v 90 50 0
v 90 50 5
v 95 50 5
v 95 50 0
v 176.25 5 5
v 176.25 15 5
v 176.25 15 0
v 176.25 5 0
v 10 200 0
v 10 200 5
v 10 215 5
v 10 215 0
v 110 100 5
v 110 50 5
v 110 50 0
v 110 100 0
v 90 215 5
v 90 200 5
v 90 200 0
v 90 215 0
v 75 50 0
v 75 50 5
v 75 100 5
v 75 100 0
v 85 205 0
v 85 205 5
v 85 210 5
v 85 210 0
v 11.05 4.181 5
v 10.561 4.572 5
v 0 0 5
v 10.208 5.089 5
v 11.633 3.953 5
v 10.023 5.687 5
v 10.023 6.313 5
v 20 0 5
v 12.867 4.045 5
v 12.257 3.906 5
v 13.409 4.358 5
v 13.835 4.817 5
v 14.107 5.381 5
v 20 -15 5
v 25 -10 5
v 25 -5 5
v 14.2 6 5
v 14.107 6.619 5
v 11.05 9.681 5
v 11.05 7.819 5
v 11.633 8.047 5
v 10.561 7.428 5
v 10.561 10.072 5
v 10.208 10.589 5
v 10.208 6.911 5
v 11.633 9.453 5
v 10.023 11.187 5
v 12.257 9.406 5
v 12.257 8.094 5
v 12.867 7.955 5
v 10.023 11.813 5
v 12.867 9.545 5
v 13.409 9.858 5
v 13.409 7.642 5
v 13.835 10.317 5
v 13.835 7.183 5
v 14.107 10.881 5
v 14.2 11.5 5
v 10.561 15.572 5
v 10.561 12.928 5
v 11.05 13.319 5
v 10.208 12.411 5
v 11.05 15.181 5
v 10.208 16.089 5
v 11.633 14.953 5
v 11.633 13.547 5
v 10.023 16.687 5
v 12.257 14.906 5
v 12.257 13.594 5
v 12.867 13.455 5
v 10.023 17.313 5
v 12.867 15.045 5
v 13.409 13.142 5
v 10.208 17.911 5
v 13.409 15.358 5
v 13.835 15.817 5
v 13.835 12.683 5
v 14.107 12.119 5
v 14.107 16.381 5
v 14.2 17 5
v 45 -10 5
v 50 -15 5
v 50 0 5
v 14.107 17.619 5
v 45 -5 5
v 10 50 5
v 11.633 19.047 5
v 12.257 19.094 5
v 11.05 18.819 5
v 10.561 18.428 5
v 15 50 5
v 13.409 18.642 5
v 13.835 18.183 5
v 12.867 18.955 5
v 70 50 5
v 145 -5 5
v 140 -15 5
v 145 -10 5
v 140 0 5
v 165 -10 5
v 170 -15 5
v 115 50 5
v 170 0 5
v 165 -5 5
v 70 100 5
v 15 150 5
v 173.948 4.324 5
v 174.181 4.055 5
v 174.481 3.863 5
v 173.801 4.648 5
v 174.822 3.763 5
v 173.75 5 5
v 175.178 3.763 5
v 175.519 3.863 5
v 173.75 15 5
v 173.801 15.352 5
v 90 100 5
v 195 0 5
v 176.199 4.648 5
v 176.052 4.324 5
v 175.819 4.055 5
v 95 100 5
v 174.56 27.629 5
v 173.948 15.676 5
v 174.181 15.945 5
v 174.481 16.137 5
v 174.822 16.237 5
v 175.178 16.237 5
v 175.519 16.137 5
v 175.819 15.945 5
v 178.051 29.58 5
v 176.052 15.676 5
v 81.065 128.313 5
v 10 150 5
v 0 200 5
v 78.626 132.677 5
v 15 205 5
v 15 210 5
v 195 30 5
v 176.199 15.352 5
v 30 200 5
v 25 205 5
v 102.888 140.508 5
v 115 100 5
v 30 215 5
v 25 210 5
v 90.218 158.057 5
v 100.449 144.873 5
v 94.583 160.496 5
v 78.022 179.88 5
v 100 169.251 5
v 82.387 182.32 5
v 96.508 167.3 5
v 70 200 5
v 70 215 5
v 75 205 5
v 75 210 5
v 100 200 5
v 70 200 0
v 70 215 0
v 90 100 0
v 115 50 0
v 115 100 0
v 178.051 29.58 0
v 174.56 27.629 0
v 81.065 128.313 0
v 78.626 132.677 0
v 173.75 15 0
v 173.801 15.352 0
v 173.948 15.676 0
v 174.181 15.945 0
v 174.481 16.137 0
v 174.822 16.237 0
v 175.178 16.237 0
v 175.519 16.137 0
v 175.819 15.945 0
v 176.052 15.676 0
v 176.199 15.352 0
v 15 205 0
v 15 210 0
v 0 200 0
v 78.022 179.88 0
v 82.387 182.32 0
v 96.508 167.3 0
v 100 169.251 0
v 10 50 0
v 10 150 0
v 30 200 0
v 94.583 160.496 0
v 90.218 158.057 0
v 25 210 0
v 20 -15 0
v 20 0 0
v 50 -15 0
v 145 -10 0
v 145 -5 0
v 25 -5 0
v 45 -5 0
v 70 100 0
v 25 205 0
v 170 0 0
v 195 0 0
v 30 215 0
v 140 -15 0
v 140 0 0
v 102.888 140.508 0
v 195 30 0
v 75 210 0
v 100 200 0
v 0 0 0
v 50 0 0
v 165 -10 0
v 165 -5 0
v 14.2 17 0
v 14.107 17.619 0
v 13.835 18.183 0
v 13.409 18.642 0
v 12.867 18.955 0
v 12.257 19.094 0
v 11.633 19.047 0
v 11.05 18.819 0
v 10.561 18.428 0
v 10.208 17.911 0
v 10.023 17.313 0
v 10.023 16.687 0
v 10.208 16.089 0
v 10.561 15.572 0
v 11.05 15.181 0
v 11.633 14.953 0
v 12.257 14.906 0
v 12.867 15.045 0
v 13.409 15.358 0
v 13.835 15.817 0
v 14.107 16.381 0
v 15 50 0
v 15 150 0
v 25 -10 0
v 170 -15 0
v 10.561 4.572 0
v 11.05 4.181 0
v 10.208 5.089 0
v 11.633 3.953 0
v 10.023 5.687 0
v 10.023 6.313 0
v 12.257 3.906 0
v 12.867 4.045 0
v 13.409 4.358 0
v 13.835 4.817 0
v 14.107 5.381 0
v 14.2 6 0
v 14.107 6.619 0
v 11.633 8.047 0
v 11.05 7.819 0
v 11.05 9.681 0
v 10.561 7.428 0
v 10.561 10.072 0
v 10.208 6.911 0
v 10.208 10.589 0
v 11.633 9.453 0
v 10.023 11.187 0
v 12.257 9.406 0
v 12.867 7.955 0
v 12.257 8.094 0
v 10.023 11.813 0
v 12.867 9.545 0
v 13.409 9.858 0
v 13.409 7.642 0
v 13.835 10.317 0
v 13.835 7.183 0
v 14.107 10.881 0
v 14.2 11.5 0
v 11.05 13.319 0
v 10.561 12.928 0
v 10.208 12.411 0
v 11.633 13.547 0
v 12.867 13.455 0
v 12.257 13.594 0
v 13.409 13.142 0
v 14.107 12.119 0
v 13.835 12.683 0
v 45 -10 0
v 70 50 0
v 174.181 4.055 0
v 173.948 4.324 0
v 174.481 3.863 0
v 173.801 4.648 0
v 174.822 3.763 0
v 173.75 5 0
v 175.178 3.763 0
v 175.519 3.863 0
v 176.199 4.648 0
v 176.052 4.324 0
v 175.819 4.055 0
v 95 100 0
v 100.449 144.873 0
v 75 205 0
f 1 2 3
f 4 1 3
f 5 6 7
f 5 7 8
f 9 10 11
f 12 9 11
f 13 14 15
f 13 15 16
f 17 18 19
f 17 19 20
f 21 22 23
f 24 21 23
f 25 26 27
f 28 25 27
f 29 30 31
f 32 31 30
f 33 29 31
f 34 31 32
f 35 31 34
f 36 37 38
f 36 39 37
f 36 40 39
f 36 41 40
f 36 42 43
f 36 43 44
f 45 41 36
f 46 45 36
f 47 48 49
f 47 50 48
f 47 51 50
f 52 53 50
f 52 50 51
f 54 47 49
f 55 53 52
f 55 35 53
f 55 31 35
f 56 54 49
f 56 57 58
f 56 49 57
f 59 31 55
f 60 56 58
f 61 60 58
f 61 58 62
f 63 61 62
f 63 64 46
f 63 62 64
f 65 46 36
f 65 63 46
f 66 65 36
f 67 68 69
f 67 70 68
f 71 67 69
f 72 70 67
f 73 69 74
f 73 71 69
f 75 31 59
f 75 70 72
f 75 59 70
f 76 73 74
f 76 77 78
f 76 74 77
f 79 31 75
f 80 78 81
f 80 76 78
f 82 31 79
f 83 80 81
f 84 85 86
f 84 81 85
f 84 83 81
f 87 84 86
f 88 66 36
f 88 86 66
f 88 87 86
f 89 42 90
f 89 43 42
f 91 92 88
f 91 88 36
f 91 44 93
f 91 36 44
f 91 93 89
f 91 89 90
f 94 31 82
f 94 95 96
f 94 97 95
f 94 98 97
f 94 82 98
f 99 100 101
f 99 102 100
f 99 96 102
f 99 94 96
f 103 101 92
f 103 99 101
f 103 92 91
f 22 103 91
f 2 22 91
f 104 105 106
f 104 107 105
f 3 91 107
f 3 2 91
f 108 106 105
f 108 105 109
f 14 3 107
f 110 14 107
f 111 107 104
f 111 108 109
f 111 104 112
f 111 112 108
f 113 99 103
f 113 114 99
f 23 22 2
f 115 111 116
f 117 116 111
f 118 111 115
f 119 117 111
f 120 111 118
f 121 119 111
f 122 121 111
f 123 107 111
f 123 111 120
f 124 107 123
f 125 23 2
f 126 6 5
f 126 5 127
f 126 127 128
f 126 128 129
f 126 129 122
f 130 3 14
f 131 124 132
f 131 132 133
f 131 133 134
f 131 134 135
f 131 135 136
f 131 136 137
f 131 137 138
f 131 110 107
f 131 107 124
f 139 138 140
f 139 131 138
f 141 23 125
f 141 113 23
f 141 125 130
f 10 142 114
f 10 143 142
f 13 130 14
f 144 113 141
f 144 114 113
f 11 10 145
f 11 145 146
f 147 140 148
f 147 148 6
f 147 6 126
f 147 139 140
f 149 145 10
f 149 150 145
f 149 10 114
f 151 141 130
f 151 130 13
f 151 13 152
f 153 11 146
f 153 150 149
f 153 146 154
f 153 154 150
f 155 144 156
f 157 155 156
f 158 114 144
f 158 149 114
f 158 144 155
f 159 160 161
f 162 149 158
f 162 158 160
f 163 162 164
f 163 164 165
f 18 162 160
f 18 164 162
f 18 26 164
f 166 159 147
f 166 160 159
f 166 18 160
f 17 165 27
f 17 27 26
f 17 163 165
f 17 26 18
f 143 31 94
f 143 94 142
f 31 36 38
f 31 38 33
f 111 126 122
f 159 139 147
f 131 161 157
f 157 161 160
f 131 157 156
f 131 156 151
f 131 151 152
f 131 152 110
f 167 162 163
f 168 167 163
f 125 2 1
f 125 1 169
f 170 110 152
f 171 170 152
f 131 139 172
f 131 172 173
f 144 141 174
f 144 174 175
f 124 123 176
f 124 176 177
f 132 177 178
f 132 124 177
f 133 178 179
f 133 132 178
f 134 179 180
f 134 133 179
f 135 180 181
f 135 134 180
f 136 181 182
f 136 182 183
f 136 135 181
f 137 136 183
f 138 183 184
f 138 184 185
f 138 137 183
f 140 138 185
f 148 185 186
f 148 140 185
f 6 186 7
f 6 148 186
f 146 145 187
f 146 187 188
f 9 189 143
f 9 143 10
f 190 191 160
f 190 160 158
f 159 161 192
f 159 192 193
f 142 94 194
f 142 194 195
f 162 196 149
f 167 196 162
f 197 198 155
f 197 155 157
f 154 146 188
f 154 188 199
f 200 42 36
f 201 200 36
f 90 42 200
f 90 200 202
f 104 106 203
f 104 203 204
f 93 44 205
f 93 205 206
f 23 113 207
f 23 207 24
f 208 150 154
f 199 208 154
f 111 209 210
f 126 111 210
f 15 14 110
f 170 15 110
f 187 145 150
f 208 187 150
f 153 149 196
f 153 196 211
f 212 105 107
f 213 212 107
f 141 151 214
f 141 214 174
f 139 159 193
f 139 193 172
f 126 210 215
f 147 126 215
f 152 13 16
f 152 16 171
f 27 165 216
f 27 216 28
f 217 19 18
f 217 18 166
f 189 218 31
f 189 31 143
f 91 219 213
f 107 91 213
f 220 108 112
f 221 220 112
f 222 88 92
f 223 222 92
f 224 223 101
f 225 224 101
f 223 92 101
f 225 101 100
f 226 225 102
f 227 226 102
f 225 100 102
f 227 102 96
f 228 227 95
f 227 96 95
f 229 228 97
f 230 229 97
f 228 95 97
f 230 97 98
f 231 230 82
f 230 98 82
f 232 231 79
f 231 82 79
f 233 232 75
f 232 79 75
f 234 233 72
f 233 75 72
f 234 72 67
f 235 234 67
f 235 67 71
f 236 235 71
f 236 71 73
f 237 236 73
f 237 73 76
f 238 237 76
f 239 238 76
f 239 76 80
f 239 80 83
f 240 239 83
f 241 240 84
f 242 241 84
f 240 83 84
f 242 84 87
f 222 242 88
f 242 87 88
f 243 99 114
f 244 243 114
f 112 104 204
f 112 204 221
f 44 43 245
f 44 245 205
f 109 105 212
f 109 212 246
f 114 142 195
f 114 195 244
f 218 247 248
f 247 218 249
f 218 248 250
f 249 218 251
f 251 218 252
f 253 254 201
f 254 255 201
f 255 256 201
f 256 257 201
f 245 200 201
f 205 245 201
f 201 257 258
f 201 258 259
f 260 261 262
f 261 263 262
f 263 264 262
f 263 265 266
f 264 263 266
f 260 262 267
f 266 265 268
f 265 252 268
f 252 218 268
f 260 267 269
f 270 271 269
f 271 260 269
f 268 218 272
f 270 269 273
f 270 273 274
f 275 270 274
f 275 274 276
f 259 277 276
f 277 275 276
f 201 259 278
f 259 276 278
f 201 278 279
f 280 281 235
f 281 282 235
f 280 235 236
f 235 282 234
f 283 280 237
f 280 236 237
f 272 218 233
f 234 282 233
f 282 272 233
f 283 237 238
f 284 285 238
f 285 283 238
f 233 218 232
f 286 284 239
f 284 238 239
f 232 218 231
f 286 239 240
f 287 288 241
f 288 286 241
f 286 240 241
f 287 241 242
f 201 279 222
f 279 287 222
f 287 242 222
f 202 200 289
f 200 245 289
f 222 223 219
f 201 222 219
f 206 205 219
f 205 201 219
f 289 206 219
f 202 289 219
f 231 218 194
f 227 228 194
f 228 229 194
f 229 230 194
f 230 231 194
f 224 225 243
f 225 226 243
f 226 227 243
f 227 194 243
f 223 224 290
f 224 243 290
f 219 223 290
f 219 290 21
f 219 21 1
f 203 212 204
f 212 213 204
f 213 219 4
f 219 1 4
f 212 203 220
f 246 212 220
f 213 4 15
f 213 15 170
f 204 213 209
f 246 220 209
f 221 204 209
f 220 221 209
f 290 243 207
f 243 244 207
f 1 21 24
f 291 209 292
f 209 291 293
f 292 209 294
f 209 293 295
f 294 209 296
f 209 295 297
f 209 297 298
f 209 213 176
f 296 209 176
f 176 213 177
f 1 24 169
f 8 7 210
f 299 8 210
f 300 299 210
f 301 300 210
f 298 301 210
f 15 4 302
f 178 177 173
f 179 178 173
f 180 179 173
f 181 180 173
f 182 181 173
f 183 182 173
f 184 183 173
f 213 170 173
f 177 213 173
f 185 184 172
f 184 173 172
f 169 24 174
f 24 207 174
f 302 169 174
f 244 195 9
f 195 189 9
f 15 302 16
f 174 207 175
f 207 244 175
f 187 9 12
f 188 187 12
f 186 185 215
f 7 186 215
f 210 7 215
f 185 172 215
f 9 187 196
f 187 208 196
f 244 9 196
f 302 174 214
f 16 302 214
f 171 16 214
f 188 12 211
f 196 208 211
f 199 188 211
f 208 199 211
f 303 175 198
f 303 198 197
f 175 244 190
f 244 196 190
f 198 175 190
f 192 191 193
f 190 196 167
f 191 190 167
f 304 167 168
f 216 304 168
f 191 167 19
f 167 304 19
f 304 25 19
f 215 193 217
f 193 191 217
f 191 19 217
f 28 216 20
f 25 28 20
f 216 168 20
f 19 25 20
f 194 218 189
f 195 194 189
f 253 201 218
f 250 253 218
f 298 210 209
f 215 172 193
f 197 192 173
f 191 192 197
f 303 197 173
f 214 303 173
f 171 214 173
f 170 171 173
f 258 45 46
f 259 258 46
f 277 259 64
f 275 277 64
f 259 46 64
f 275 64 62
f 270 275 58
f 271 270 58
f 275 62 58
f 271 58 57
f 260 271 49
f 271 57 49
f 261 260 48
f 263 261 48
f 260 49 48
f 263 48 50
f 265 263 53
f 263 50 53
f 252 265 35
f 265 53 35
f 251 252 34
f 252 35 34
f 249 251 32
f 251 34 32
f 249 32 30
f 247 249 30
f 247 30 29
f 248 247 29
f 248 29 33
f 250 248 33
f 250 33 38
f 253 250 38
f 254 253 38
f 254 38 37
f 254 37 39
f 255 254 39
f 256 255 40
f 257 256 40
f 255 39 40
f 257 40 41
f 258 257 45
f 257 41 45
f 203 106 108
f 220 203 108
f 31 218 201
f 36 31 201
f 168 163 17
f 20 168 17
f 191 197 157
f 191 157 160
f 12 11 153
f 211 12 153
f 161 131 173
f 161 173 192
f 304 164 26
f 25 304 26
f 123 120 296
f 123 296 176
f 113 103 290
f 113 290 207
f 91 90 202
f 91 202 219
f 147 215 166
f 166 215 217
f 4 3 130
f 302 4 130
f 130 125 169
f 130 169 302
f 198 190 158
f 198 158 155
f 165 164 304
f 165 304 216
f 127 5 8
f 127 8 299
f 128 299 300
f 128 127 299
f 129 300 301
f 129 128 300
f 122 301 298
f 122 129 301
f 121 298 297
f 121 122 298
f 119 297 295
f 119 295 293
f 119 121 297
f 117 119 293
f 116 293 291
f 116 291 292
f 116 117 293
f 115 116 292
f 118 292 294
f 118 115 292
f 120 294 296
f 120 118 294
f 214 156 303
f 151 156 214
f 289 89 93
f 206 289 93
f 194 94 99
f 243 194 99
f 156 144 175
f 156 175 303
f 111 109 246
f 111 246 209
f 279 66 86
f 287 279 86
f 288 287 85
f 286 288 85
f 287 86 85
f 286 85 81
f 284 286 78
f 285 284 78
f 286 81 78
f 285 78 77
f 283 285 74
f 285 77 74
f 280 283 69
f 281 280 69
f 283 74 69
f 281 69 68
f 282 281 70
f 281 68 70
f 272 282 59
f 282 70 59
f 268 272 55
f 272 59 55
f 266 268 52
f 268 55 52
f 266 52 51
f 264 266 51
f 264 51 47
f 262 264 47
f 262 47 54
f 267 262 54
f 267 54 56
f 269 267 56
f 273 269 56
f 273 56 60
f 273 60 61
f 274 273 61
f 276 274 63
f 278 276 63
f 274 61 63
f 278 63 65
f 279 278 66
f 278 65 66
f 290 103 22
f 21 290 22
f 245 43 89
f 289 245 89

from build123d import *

# Parameters (mm, degrees)
SKETCH1_W           = 100
SKETCH1_H           = 200
SKETCH1_W_2         = 95
SKETCH1_H_2         = 30
BOSS_EXTRUDE1_DEPTH = 5
SKETCH2_R           = 2.1
CUT_EXTRUDE1_DEPTH  = 5
SKETCH3_W           = 20
SKETCH3_H           = 15
SKETCH3_W_2         = 10
SKETCH3_H_2         = 5
BOSS_EXTRUDE2_DEPTH = 5
SKETCH4_R           = 2.1
CUT_EXTRUDE2_DEPTH  = 5
SKETCH5_W           = 30
SKETCH5_H           = 15
SKETCH5_W_2         = 20
SKETCH5_H_2         = 5
BOSS_EXTRUDE3_DEPTH = 5
CUT_EXTRUDE3_DEPTH  = 5
SKETCH7_W           = 5
SKETCH7_H           = 50
CUT_EXTRUDE4_DEPTH  = 5
CUT_EXTRUDE5_DEPTH  = 5
SKETCH9_W           = 5
SKETCH9_H           = 100
CUT_EXTRUDE6_DEPTH  = 5
CUT_EXTRUDE7_DEPTH  = 5


with BuildPart() as part:
    # Sketch1 → Boss-Extrude1 (new body)
    with BuildSketch(Plane.XY):
        Polygon((100, 30), (195, 30), (100, 200), align=None)
        with Locations((50, 100)):
            Rectangle(SKETCH1_W, SKETCH1_H)
        with Locations((147.5, 15)):
            Rectangle(SKETCH1_W_2, SKETCH1_H_2)
    extrude(amount=BOSS_EXTRUDE1_DEPTH)

    # Sketch2 → Cut-Extrude1 (cut)
    with BuildSketch(Plane.XY.offset(5)):
        with Locations((12.1, 6)):
            Circle(SKETCH2_R)
    extrude(amount=-CUT_EXTRUDE1_DEPTH, mode=Mode.SUBTRACT)

    # Sketch3 → Boss-Extrude2 (add)
    # profile 1 of 2: a face of its own
    with BuildSketch(Plane.XY.offset(5)):
        with Locations((20, 207.5)):
            Rectangle(SKETCH3_W, SKETCH3_H)
        with Locations((20, 207.5)):
            Rectangle(SKETCH3_W_2, SKETCH3_H_2, mode=Mode.SUBTRACT)
    # profile 2 of 2: a face of its own
    with BuildSketch(Plane.XY.offset(5)):
        with Locations((80, 207.5)):
            Rectangle(SKETCH3_W, SKETCH3_H)
        with Locations((80, 207.5)):
            Rectangle(SKETCH3_W_2, SKETCH3_H_2, mode=Mode.SUBTRACT)
    extrude(amount=-BOSS_EXTRUDE2_DEPTH)

    # Sketch4 → Cut-Extrude2 (cut)
    with BuildSketch(Plane.XY.offset(5)):
        with Locations((12.1, 11.5)):
            Circle(SKETCH4_R)
        with Locations((12.1, 17)):
            Circle(SKETCH4_R)
    extrude(amount=-CUT_EXTRUDE2_DEPTH, mode=Mode.SUBTRACT)

    # Sketch5 → Boss-Extrude3 (add)
    # profile 1 of 2: a face of its own
    with BuildSketch(Plane.XY.offset(5)):
        with Locations((35, -7.5)):
            Rectangle(SKETCH5_W, SKETCH5_H)
        with Locations((35, -7.5)):
            Rectangle(SKETCH5_W_2, SKETCH5_H_2, mode=Mode.SUBTRACT)
    # profile 2 of 2: a face of its own
    with BuildSketch(Plane.XY.offset(5)):
        with Locations((155, -7.5)):
            Rectangle(SKETCH5_W, SKETCH5_H)
        with Locations((155, -7.5)):
            Rectangle(SKETCH5_W_2, SKETCH5_H_2, mode=Mode.SUBTRACT)
    extrude(amount=-BOSS_EXTRUDE3_DEPTH)

    # Sketch6 → Cut-Extrude3 (cut)
    with BuildSketch(Plane.XY.offset(5)):
        Polygon((100, 169.251038799), (178.051417226, 29.580081657), (174.559643298, 27.628796226), (96.508226071, 167.299753368), align=None)
    extrude(amount=-CUT_EXTRUDE3_DEPTH, mode=Mode.SUBTRACT)

    # Sketch7 → Cut-Extrude4 (cut)
    with BuildSketch(Plane.XY.offset(5)):
        with Locations((72.5, 75)):
            Rectangle(SKETCH7_W, SKETCH7_H)
        with Locations((92.5, 75)):
            Rectangle(SKETCH7_W, SKETCH7_H)
        with Locations((112.5, 75)):
            Rectangle(SKETCH7_W, SKETCH7_H)
    extrude(amount=-CUT_EXTRUDE4_DEPTH, mode=Mode.SUBTRACT)

    # Sketch8 → Cut-Extrude5 (cut)
    with BuildSketch(Plane.XY.offset(5)):
        with BuildLine():
            Line((176.25, 15), (176.25, 5))
            ThreePointArc((176.25, 5), (175, 3.75), (173.75, 5))
            Line((173.75, 5), (173.75, 15))
            ThreePointArc((173.75, 15), (175, 16.25), (176.25, 15))
        make_face()
    extrude(amount=-CUT_EXTRUDE5_DEPTH, mode=Mode.SUBTRACT)

    # Sketch9 → Cut-Extrude6 (cut)
    with BuildSketch(Plane.XY.offset(5)):
        Polygon((78.625722092, 132.677274378), (100.449309145, 144.87280832), (102.888415934, 140.508090909), (81.06482888, 128.312556967), align=None)
        with Locations((12.5, 100)):
            Rectangle(SKETCH9_W, SKETCH9_H)
    extrude(amount=-CUT_EXTRUDE6_DEPTH, mode=Mode.SUBTRACT)

    # Sketch10 → Cut-Extrude7 (cut)
    with BuildSketch(Plane(origin=(0, 0, 0), x_dir=(-1, 0, 0), z_dir=(0, 0, -1))):
        Polygon((-94.582615449, 160.495929169), (-82.387081507, 182.319516222), (-78.022364097, 179.880409434), (-90.217898038, 158.056822381), align=None)
    extrude(amount=-CUT_EXTRUDE7_DEPTH, mode=Mode.SUBTRACT)


solid = part.part
